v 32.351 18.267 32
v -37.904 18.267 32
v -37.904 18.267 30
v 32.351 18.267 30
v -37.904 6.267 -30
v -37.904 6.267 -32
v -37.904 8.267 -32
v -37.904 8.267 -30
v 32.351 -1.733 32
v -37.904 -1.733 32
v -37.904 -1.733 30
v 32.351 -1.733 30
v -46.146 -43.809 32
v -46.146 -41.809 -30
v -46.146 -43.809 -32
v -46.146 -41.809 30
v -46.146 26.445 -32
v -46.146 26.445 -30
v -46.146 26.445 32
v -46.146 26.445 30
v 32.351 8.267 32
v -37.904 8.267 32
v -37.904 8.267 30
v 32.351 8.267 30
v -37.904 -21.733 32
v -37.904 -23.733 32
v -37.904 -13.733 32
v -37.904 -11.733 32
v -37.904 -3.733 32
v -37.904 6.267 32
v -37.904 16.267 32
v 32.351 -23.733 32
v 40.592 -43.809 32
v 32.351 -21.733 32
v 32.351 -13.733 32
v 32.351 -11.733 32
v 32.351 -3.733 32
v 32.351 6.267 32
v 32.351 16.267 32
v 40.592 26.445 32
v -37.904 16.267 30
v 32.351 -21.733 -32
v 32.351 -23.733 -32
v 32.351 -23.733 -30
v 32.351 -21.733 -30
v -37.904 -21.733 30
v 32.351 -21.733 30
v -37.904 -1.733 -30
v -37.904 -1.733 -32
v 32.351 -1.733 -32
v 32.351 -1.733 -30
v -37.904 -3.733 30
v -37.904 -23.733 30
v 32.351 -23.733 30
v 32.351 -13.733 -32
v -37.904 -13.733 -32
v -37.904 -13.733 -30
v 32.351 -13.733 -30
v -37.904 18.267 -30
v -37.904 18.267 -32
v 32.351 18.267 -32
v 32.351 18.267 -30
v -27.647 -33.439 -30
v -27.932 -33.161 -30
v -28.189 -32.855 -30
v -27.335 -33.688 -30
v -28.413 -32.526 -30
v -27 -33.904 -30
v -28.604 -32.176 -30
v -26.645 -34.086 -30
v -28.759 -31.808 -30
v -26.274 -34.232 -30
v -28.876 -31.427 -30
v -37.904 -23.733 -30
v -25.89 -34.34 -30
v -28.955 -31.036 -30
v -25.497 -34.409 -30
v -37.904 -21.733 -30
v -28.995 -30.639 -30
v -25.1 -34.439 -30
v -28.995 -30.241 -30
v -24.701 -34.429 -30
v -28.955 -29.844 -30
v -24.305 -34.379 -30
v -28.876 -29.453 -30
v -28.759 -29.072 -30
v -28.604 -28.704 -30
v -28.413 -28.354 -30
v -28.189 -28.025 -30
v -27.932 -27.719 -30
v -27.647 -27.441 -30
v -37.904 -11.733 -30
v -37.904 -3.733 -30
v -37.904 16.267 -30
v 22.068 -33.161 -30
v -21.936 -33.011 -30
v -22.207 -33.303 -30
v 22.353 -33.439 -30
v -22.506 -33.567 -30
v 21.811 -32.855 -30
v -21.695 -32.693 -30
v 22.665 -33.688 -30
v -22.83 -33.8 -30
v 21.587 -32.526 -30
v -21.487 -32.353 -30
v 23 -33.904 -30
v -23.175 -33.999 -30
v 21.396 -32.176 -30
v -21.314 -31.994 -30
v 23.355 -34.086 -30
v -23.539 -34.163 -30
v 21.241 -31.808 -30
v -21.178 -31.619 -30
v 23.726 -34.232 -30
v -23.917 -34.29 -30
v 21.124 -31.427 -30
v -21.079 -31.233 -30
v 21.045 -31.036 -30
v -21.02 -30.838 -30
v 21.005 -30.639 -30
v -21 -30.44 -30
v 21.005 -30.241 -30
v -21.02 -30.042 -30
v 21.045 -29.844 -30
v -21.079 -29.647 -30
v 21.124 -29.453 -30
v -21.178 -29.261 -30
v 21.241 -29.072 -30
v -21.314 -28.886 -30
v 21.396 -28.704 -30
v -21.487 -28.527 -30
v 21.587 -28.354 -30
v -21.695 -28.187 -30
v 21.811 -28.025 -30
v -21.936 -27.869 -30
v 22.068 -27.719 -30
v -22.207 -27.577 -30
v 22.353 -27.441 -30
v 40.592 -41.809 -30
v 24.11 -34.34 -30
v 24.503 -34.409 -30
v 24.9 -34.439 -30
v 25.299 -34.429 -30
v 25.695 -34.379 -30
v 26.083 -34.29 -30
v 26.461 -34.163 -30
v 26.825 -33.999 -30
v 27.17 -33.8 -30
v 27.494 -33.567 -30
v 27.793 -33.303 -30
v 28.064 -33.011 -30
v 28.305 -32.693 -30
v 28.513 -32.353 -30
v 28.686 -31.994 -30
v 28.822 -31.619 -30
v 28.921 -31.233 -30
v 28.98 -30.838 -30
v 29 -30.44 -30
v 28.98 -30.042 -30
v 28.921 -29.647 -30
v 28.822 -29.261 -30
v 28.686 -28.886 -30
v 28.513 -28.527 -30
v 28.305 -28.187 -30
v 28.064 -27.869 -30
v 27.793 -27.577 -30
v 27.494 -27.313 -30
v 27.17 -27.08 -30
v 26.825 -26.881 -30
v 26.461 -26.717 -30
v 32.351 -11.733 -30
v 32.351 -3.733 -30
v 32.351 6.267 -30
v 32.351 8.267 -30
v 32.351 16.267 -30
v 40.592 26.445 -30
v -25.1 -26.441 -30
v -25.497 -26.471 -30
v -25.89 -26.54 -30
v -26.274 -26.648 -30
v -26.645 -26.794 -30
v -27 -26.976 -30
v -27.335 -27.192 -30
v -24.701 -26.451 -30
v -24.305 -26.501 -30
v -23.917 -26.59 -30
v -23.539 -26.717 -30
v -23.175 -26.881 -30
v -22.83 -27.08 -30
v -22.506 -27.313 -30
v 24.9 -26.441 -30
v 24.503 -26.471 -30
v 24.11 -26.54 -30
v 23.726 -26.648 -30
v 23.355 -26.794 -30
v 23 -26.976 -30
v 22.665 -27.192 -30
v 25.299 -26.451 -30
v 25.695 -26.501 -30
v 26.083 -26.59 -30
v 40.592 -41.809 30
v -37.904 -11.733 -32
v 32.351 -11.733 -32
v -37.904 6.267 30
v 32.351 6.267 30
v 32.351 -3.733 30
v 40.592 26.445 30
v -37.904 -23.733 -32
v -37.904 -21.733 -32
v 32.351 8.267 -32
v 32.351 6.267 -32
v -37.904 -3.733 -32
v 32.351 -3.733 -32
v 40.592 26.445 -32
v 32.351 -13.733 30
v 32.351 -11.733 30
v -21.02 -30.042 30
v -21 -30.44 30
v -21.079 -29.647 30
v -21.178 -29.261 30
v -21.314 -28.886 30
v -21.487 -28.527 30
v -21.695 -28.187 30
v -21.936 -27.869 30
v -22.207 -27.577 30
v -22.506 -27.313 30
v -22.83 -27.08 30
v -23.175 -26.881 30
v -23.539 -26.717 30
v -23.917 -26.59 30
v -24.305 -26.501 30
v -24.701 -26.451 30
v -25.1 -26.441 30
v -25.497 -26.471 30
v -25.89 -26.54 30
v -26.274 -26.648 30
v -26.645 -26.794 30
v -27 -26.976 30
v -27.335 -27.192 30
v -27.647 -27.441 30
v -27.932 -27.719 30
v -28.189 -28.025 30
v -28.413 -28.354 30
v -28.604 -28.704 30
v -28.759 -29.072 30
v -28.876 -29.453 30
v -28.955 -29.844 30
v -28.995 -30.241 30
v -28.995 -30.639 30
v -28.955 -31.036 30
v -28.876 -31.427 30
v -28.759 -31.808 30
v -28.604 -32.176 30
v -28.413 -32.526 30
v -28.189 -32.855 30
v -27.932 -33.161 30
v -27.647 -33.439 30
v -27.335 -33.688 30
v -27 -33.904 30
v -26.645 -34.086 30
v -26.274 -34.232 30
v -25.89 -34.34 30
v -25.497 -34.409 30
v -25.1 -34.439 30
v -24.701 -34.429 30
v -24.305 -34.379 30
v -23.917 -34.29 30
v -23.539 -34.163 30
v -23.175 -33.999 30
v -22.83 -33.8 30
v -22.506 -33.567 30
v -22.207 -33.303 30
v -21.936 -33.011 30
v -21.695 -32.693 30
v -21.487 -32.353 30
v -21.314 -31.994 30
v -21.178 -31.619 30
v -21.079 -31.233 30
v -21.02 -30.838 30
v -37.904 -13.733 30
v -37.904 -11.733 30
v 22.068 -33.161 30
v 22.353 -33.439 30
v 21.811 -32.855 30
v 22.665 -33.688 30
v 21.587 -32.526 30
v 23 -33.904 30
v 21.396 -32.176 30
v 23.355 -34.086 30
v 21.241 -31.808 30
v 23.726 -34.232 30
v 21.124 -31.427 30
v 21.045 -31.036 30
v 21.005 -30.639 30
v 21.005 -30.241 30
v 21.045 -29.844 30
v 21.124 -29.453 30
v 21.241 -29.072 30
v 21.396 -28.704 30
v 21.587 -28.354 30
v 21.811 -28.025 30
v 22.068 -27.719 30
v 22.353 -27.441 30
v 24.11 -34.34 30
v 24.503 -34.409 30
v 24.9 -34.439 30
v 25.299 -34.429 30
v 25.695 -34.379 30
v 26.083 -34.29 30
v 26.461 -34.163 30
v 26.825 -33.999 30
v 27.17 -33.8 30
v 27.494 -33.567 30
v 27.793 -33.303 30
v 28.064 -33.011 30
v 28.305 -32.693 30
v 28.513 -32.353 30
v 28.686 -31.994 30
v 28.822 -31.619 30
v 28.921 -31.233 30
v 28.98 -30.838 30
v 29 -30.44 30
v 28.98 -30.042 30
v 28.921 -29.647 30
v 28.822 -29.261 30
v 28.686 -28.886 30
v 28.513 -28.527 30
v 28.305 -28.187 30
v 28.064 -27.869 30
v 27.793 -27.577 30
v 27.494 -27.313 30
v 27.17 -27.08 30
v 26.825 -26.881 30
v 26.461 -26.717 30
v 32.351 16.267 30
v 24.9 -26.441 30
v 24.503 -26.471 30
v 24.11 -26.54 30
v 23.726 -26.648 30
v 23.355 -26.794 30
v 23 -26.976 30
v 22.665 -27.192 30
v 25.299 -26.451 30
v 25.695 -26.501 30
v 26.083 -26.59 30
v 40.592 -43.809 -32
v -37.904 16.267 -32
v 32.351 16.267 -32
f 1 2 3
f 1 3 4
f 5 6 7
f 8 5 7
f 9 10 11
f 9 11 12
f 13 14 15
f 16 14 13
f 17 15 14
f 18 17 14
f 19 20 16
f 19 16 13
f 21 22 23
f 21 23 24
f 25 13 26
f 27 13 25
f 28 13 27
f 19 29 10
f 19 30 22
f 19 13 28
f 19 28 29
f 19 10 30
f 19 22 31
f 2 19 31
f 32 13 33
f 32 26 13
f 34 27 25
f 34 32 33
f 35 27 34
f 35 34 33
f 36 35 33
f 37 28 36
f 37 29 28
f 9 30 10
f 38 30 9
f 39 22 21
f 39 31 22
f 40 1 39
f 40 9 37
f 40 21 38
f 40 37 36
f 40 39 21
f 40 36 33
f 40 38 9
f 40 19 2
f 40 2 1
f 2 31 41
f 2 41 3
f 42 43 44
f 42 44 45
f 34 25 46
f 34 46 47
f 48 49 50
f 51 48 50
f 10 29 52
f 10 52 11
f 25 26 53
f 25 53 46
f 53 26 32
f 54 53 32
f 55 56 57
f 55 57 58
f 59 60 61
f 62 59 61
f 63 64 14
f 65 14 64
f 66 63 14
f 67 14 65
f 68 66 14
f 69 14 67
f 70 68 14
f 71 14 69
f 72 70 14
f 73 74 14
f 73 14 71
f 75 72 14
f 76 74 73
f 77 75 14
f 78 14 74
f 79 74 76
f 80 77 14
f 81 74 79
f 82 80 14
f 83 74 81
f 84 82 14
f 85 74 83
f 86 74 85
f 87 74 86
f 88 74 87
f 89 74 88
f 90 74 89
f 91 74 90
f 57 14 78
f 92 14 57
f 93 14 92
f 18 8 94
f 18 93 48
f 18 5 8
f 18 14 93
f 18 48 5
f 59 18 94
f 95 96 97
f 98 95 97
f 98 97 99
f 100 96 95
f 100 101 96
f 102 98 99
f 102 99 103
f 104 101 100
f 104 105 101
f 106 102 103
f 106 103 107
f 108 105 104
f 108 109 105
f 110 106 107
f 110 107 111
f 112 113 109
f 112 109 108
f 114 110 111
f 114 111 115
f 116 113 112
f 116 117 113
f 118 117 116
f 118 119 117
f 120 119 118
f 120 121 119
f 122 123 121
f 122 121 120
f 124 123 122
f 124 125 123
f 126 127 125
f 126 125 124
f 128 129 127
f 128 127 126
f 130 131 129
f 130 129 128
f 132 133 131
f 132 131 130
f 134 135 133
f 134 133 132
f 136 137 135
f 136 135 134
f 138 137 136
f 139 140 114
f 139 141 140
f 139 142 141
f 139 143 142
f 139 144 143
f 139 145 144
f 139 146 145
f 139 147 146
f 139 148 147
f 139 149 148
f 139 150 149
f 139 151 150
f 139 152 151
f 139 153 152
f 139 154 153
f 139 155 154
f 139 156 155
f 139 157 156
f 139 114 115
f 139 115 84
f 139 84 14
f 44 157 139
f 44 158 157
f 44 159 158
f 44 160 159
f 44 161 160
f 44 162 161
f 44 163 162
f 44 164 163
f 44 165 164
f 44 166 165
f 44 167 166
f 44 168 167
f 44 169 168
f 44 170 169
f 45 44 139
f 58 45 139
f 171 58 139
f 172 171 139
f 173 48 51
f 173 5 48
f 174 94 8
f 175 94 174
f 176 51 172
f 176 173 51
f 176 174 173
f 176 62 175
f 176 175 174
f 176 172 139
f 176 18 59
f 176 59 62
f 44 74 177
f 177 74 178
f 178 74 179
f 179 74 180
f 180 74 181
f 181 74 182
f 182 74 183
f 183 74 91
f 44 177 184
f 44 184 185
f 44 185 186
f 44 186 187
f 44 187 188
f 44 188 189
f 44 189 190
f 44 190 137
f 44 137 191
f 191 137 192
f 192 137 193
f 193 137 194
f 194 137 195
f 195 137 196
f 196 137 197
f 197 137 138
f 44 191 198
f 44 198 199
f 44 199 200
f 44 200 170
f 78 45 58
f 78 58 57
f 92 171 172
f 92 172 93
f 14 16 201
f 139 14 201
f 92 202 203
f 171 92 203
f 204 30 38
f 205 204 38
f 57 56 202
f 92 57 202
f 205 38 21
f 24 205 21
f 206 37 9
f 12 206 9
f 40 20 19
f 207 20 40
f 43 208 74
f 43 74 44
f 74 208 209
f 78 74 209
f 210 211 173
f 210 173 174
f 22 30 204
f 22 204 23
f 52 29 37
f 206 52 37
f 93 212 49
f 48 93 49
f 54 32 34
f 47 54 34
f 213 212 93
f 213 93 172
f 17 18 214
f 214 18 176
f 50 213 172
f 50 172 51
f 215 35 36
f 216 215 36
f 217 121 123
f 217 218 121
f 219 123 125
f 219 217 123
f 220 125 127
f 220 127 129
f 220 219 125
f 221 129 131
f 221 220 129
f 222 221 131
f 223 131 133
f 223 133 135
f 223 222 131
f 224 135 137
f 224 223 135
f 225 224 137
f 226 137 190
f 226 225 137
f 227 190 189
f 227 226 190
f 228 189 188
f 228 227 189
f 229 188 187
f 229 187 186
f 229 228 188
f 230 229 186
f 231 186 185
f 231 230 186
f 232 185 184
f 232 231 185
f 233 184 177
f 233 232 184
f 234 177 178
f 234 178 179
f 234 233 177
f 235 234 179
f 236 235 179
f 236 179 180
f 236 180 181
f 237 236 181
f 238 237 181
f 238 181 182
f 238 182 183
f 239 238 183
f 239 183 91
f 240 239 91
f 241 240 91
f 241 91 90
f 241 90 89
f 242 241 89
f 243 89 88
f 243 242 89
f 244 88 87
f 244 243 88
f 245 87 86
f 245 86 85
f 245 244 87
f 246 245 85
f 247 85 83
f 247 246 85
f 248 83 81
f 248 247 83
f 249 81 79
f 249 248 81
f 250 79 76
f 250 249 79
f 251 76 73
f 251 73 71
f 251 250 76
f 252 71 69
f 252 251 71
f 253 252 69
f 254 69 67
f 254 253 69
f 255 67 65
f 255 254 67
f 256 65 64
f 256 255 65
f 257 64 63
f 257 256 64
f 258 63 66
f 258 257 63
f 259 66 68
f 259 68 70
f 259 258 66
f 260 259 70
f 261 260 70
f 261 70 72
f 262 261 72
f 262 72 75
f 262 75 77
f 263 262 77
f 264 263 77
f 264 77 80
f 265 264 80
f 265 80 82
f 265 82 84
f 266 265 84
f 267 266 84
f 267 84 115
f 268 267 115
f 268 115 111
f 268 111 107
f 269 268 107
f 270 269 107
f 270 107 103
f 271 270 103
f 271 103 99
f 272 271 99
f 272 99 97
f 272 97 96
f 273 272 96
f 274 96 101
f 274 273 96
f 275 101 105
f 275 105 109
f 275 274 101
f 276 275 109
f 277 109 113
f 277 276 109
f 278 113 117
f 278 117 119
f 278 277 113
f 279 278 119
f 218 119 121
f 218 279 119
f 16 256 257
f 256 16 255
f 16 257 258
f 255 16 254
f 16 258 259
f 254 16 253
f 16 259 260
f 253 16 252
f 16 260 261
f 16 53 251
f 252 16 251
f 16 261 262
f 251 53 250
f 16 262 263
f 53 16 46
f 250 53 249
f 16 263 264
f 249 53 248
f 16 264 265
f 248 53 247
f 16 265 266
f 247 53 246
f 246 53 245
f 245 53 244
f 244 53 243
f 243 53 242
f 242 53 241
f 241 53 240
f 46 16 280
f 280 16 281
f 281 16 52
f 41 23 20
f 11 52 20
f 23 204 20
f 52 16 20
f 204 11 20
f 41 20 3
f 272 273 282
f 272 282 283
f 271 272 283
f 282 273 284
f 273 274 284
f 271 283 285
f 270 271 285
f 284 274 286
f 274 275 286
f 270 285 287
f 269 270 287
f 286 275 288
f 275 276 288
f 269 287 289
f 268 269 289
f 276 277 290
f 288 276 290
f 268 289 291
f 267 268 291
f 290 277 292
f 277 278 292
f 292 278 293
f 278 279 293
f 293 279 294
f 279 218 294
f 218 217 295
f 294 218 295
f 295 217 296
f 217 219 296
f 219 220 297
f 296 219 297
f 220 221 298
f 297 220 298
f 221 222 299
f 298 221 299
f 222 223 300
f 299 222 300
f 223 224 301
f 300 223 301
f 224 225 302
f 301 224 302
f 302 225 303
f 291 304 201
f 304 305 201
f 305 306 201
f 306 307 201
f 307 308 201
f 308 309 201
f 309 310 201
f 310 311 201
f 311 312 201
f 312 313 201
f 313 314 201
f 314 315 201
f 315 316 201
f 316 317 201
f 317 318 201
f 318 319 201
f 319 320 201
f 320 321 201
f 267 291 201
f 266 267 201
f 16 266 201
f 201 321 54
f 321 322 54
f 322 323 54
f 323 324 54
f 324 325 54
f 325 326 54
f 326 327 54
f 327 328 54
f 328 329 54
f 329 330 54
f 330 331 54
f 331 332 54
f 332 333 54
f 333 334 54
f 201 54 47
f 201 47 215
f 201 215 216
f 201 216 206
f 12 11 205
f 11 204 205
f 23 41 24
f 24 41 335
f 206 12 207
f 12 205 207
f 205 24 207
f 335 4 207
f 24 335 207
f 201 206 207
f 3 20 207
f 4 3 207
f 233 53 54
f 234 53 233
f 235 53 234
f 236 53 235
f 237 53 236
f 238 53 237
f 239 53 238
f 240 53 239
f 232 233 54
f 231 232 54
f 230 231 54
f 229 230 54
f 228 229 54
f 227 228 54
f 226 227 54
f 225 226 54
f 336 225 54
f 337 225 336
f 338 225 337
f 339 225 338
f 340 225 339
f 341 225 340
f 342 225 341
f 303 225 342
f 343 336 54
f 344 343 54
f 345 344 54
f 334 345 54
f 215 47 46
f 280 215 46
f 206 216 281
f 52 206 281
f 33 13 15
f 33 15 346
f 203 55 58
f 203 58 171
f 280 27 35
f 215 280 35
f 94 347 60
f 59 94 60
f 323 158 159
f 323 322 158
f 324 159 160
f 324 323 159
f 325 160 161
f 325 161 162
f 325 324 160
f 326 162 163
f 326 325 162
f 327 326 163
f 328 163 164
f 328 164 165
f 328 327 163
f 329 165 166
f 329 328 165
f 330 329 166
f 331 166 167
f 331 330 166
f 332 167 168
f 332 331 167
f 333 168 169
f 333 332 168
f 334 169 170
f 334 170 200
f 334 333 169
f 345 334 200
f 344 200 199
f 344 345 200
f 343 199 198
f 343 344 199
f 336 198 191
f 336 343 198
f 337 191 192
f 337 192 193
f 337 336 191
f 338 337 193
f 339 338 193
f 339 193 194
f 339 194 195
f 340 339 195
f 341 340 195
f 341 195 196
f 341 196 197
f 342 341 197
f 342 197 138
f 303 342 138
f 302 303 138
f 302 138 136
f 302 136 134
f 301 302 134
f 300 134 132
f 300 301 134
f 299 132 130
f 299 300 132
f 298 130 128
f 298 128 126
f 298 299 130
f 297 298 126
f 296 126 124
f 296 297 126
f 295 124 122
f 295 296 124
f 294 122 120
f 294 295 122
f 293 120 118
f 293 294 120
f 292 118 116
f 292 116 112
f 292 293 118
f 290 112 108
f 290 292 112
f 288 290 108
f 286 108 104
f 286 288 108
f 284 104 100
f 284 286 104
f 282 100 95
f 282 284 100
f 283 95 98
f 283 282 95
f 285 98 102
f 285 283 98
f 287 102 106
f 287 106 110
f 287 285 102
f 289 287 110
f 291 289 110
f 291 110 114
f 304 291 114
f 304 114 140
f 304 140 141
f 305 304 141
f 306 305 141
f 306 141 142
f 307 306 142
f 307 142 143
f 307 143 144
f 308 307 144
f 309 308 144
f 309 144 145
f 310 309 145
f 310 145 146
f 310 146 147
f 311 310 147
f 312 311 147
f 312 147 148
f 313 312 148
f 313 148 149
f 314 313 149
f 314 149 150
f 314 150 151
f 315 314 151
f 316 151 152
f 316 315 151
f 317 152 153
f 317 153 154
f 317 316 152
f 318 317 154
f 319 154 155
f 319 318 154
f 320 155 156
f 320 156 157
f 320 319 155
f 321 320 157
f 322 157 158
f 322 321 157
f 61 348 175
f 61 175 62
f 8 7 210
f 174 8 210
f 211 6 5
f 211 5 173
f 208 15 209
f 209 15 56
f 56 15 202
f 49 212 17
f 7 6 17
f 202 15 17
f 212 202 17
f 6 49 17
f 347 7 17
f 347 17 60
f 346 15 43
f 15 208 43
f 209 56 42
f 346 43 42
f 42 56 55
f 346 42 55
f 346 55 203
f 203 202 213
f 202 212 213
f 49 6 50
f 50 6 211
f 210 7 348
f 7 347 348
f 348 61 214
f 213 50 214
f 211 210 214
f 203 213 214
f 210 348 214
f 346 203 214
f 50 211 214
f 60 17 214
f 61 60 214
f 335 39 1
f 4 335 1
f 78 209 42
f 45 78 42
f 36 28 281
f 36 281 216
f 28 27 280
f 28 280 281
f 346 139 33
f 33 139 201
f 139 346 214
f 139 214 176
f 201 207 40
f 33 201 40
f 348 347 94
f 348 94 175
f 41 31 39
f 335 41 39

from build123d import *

# Parameters (mm, degrees)
SKETCH1_R               = 4
BOSS_EXTRUDE1_DEPTH     = 30
BOSS_EXTRUDE1_2_DEPTH   = 30
SKETCH2_W               = 86.738485283
SKETCH2_H               = 68.254231625
BOSS_EXTRUDE2_DEPTH     = 2
SKETCH4_W               = 70.255349131
SKETCH4_H               = 2
CUT_EXTRUDE_THIN1_DEPTH = 2
SKETCH3_W               = 86.738485283
SKETCH3_H               = 64
BOSS_EXTRUDE3_DEPTH     = 2


with BuildPart() as part:
    # Sketch1 → Boss-Extrude1 (new body, symmetric)
    with BuildSketch(Plane.XY):
        with Locations((-25, -30.44)):
            Circle(SKETCH1_R)
    extrude(amount=BOSS_EXTRUDE1_DEPTH, both=True)



with BuildPart() as body_2:
    # Sketch1 → Boss-Extrude1 2 (new body, symmetric)
    with BuildSketch(Plane.XY):
        with Locations((25, -30.44)):
            Circle(SKETCH1_R)
    extrude(amount=BOSS_EXTRUDE1_2_DEPTH, both=True)


with BuildPart() as part_1:
    add(part.part)

    add(body_2.part)  # Boss-Extrude2 merges body 2
    # Sketch2 → Boss-Extrude2 (add)
    with BuildSketch(Plane.XY.offset(30)):
        with Locations((-2.776823357, -7.681992187)):
            Rectangle(SKETCH2_W, SKETCH2_H)
    boss_extrude2 = extrude(amount=BOSS_EXTRUDE2_DEPTH)

    # Sketch4 → Cut-Extrude-Thin1 (cut)
    with BuildSketch(Plane.XY.offset(32)):
        with Locations((-2.776823357, 17.267458724)):
            Rectangle(SKETCH4_W, SKETCH4_H)
        with Locations((-2.776823357, 7.267458724)):
            Rectangle(SKETCH4_W, SKETCH4_H)
        with Locations((-2.776823357, -2.732541276)):
            Rectangle(SKETCH4_W, SKETCH4_H)
        with Locations((-2.776823357, -12.732541276)):
            Rectangle(SKETCH4_W, SKETCH4_H)
        with Locations((-2.776823357, -22.732541276)):
            Rectangle(SKETCH4_W, SKETCH4_H)
    cut_extrude_thin1 = extrude(amount=-CUT_EXTRUDE_THIN1_DEPTH, mode=Mode.SUBTRACT)

    # Mirror1: Boss-Extrude2, Cut-Extrude-Thin1 across plane
    add(boss_extrude2.mirror(Plane.XY))
    add(cut_extrude_thin1.mirror(Plane.XY), mode=Mode.SUBTRACT)

    # Sketch3 → Boss-Extrude3 (add)
    with BuildSketch(Plane.XZ.offset(41.809107999)):
        with Locations((-2.776823357, 0)):
            Rectangle(SKETCH3_W, SKETCH3_H)
    extrude(amount=BOSS_EXTRUDE3_DEPTH)


solid = part_1.part
